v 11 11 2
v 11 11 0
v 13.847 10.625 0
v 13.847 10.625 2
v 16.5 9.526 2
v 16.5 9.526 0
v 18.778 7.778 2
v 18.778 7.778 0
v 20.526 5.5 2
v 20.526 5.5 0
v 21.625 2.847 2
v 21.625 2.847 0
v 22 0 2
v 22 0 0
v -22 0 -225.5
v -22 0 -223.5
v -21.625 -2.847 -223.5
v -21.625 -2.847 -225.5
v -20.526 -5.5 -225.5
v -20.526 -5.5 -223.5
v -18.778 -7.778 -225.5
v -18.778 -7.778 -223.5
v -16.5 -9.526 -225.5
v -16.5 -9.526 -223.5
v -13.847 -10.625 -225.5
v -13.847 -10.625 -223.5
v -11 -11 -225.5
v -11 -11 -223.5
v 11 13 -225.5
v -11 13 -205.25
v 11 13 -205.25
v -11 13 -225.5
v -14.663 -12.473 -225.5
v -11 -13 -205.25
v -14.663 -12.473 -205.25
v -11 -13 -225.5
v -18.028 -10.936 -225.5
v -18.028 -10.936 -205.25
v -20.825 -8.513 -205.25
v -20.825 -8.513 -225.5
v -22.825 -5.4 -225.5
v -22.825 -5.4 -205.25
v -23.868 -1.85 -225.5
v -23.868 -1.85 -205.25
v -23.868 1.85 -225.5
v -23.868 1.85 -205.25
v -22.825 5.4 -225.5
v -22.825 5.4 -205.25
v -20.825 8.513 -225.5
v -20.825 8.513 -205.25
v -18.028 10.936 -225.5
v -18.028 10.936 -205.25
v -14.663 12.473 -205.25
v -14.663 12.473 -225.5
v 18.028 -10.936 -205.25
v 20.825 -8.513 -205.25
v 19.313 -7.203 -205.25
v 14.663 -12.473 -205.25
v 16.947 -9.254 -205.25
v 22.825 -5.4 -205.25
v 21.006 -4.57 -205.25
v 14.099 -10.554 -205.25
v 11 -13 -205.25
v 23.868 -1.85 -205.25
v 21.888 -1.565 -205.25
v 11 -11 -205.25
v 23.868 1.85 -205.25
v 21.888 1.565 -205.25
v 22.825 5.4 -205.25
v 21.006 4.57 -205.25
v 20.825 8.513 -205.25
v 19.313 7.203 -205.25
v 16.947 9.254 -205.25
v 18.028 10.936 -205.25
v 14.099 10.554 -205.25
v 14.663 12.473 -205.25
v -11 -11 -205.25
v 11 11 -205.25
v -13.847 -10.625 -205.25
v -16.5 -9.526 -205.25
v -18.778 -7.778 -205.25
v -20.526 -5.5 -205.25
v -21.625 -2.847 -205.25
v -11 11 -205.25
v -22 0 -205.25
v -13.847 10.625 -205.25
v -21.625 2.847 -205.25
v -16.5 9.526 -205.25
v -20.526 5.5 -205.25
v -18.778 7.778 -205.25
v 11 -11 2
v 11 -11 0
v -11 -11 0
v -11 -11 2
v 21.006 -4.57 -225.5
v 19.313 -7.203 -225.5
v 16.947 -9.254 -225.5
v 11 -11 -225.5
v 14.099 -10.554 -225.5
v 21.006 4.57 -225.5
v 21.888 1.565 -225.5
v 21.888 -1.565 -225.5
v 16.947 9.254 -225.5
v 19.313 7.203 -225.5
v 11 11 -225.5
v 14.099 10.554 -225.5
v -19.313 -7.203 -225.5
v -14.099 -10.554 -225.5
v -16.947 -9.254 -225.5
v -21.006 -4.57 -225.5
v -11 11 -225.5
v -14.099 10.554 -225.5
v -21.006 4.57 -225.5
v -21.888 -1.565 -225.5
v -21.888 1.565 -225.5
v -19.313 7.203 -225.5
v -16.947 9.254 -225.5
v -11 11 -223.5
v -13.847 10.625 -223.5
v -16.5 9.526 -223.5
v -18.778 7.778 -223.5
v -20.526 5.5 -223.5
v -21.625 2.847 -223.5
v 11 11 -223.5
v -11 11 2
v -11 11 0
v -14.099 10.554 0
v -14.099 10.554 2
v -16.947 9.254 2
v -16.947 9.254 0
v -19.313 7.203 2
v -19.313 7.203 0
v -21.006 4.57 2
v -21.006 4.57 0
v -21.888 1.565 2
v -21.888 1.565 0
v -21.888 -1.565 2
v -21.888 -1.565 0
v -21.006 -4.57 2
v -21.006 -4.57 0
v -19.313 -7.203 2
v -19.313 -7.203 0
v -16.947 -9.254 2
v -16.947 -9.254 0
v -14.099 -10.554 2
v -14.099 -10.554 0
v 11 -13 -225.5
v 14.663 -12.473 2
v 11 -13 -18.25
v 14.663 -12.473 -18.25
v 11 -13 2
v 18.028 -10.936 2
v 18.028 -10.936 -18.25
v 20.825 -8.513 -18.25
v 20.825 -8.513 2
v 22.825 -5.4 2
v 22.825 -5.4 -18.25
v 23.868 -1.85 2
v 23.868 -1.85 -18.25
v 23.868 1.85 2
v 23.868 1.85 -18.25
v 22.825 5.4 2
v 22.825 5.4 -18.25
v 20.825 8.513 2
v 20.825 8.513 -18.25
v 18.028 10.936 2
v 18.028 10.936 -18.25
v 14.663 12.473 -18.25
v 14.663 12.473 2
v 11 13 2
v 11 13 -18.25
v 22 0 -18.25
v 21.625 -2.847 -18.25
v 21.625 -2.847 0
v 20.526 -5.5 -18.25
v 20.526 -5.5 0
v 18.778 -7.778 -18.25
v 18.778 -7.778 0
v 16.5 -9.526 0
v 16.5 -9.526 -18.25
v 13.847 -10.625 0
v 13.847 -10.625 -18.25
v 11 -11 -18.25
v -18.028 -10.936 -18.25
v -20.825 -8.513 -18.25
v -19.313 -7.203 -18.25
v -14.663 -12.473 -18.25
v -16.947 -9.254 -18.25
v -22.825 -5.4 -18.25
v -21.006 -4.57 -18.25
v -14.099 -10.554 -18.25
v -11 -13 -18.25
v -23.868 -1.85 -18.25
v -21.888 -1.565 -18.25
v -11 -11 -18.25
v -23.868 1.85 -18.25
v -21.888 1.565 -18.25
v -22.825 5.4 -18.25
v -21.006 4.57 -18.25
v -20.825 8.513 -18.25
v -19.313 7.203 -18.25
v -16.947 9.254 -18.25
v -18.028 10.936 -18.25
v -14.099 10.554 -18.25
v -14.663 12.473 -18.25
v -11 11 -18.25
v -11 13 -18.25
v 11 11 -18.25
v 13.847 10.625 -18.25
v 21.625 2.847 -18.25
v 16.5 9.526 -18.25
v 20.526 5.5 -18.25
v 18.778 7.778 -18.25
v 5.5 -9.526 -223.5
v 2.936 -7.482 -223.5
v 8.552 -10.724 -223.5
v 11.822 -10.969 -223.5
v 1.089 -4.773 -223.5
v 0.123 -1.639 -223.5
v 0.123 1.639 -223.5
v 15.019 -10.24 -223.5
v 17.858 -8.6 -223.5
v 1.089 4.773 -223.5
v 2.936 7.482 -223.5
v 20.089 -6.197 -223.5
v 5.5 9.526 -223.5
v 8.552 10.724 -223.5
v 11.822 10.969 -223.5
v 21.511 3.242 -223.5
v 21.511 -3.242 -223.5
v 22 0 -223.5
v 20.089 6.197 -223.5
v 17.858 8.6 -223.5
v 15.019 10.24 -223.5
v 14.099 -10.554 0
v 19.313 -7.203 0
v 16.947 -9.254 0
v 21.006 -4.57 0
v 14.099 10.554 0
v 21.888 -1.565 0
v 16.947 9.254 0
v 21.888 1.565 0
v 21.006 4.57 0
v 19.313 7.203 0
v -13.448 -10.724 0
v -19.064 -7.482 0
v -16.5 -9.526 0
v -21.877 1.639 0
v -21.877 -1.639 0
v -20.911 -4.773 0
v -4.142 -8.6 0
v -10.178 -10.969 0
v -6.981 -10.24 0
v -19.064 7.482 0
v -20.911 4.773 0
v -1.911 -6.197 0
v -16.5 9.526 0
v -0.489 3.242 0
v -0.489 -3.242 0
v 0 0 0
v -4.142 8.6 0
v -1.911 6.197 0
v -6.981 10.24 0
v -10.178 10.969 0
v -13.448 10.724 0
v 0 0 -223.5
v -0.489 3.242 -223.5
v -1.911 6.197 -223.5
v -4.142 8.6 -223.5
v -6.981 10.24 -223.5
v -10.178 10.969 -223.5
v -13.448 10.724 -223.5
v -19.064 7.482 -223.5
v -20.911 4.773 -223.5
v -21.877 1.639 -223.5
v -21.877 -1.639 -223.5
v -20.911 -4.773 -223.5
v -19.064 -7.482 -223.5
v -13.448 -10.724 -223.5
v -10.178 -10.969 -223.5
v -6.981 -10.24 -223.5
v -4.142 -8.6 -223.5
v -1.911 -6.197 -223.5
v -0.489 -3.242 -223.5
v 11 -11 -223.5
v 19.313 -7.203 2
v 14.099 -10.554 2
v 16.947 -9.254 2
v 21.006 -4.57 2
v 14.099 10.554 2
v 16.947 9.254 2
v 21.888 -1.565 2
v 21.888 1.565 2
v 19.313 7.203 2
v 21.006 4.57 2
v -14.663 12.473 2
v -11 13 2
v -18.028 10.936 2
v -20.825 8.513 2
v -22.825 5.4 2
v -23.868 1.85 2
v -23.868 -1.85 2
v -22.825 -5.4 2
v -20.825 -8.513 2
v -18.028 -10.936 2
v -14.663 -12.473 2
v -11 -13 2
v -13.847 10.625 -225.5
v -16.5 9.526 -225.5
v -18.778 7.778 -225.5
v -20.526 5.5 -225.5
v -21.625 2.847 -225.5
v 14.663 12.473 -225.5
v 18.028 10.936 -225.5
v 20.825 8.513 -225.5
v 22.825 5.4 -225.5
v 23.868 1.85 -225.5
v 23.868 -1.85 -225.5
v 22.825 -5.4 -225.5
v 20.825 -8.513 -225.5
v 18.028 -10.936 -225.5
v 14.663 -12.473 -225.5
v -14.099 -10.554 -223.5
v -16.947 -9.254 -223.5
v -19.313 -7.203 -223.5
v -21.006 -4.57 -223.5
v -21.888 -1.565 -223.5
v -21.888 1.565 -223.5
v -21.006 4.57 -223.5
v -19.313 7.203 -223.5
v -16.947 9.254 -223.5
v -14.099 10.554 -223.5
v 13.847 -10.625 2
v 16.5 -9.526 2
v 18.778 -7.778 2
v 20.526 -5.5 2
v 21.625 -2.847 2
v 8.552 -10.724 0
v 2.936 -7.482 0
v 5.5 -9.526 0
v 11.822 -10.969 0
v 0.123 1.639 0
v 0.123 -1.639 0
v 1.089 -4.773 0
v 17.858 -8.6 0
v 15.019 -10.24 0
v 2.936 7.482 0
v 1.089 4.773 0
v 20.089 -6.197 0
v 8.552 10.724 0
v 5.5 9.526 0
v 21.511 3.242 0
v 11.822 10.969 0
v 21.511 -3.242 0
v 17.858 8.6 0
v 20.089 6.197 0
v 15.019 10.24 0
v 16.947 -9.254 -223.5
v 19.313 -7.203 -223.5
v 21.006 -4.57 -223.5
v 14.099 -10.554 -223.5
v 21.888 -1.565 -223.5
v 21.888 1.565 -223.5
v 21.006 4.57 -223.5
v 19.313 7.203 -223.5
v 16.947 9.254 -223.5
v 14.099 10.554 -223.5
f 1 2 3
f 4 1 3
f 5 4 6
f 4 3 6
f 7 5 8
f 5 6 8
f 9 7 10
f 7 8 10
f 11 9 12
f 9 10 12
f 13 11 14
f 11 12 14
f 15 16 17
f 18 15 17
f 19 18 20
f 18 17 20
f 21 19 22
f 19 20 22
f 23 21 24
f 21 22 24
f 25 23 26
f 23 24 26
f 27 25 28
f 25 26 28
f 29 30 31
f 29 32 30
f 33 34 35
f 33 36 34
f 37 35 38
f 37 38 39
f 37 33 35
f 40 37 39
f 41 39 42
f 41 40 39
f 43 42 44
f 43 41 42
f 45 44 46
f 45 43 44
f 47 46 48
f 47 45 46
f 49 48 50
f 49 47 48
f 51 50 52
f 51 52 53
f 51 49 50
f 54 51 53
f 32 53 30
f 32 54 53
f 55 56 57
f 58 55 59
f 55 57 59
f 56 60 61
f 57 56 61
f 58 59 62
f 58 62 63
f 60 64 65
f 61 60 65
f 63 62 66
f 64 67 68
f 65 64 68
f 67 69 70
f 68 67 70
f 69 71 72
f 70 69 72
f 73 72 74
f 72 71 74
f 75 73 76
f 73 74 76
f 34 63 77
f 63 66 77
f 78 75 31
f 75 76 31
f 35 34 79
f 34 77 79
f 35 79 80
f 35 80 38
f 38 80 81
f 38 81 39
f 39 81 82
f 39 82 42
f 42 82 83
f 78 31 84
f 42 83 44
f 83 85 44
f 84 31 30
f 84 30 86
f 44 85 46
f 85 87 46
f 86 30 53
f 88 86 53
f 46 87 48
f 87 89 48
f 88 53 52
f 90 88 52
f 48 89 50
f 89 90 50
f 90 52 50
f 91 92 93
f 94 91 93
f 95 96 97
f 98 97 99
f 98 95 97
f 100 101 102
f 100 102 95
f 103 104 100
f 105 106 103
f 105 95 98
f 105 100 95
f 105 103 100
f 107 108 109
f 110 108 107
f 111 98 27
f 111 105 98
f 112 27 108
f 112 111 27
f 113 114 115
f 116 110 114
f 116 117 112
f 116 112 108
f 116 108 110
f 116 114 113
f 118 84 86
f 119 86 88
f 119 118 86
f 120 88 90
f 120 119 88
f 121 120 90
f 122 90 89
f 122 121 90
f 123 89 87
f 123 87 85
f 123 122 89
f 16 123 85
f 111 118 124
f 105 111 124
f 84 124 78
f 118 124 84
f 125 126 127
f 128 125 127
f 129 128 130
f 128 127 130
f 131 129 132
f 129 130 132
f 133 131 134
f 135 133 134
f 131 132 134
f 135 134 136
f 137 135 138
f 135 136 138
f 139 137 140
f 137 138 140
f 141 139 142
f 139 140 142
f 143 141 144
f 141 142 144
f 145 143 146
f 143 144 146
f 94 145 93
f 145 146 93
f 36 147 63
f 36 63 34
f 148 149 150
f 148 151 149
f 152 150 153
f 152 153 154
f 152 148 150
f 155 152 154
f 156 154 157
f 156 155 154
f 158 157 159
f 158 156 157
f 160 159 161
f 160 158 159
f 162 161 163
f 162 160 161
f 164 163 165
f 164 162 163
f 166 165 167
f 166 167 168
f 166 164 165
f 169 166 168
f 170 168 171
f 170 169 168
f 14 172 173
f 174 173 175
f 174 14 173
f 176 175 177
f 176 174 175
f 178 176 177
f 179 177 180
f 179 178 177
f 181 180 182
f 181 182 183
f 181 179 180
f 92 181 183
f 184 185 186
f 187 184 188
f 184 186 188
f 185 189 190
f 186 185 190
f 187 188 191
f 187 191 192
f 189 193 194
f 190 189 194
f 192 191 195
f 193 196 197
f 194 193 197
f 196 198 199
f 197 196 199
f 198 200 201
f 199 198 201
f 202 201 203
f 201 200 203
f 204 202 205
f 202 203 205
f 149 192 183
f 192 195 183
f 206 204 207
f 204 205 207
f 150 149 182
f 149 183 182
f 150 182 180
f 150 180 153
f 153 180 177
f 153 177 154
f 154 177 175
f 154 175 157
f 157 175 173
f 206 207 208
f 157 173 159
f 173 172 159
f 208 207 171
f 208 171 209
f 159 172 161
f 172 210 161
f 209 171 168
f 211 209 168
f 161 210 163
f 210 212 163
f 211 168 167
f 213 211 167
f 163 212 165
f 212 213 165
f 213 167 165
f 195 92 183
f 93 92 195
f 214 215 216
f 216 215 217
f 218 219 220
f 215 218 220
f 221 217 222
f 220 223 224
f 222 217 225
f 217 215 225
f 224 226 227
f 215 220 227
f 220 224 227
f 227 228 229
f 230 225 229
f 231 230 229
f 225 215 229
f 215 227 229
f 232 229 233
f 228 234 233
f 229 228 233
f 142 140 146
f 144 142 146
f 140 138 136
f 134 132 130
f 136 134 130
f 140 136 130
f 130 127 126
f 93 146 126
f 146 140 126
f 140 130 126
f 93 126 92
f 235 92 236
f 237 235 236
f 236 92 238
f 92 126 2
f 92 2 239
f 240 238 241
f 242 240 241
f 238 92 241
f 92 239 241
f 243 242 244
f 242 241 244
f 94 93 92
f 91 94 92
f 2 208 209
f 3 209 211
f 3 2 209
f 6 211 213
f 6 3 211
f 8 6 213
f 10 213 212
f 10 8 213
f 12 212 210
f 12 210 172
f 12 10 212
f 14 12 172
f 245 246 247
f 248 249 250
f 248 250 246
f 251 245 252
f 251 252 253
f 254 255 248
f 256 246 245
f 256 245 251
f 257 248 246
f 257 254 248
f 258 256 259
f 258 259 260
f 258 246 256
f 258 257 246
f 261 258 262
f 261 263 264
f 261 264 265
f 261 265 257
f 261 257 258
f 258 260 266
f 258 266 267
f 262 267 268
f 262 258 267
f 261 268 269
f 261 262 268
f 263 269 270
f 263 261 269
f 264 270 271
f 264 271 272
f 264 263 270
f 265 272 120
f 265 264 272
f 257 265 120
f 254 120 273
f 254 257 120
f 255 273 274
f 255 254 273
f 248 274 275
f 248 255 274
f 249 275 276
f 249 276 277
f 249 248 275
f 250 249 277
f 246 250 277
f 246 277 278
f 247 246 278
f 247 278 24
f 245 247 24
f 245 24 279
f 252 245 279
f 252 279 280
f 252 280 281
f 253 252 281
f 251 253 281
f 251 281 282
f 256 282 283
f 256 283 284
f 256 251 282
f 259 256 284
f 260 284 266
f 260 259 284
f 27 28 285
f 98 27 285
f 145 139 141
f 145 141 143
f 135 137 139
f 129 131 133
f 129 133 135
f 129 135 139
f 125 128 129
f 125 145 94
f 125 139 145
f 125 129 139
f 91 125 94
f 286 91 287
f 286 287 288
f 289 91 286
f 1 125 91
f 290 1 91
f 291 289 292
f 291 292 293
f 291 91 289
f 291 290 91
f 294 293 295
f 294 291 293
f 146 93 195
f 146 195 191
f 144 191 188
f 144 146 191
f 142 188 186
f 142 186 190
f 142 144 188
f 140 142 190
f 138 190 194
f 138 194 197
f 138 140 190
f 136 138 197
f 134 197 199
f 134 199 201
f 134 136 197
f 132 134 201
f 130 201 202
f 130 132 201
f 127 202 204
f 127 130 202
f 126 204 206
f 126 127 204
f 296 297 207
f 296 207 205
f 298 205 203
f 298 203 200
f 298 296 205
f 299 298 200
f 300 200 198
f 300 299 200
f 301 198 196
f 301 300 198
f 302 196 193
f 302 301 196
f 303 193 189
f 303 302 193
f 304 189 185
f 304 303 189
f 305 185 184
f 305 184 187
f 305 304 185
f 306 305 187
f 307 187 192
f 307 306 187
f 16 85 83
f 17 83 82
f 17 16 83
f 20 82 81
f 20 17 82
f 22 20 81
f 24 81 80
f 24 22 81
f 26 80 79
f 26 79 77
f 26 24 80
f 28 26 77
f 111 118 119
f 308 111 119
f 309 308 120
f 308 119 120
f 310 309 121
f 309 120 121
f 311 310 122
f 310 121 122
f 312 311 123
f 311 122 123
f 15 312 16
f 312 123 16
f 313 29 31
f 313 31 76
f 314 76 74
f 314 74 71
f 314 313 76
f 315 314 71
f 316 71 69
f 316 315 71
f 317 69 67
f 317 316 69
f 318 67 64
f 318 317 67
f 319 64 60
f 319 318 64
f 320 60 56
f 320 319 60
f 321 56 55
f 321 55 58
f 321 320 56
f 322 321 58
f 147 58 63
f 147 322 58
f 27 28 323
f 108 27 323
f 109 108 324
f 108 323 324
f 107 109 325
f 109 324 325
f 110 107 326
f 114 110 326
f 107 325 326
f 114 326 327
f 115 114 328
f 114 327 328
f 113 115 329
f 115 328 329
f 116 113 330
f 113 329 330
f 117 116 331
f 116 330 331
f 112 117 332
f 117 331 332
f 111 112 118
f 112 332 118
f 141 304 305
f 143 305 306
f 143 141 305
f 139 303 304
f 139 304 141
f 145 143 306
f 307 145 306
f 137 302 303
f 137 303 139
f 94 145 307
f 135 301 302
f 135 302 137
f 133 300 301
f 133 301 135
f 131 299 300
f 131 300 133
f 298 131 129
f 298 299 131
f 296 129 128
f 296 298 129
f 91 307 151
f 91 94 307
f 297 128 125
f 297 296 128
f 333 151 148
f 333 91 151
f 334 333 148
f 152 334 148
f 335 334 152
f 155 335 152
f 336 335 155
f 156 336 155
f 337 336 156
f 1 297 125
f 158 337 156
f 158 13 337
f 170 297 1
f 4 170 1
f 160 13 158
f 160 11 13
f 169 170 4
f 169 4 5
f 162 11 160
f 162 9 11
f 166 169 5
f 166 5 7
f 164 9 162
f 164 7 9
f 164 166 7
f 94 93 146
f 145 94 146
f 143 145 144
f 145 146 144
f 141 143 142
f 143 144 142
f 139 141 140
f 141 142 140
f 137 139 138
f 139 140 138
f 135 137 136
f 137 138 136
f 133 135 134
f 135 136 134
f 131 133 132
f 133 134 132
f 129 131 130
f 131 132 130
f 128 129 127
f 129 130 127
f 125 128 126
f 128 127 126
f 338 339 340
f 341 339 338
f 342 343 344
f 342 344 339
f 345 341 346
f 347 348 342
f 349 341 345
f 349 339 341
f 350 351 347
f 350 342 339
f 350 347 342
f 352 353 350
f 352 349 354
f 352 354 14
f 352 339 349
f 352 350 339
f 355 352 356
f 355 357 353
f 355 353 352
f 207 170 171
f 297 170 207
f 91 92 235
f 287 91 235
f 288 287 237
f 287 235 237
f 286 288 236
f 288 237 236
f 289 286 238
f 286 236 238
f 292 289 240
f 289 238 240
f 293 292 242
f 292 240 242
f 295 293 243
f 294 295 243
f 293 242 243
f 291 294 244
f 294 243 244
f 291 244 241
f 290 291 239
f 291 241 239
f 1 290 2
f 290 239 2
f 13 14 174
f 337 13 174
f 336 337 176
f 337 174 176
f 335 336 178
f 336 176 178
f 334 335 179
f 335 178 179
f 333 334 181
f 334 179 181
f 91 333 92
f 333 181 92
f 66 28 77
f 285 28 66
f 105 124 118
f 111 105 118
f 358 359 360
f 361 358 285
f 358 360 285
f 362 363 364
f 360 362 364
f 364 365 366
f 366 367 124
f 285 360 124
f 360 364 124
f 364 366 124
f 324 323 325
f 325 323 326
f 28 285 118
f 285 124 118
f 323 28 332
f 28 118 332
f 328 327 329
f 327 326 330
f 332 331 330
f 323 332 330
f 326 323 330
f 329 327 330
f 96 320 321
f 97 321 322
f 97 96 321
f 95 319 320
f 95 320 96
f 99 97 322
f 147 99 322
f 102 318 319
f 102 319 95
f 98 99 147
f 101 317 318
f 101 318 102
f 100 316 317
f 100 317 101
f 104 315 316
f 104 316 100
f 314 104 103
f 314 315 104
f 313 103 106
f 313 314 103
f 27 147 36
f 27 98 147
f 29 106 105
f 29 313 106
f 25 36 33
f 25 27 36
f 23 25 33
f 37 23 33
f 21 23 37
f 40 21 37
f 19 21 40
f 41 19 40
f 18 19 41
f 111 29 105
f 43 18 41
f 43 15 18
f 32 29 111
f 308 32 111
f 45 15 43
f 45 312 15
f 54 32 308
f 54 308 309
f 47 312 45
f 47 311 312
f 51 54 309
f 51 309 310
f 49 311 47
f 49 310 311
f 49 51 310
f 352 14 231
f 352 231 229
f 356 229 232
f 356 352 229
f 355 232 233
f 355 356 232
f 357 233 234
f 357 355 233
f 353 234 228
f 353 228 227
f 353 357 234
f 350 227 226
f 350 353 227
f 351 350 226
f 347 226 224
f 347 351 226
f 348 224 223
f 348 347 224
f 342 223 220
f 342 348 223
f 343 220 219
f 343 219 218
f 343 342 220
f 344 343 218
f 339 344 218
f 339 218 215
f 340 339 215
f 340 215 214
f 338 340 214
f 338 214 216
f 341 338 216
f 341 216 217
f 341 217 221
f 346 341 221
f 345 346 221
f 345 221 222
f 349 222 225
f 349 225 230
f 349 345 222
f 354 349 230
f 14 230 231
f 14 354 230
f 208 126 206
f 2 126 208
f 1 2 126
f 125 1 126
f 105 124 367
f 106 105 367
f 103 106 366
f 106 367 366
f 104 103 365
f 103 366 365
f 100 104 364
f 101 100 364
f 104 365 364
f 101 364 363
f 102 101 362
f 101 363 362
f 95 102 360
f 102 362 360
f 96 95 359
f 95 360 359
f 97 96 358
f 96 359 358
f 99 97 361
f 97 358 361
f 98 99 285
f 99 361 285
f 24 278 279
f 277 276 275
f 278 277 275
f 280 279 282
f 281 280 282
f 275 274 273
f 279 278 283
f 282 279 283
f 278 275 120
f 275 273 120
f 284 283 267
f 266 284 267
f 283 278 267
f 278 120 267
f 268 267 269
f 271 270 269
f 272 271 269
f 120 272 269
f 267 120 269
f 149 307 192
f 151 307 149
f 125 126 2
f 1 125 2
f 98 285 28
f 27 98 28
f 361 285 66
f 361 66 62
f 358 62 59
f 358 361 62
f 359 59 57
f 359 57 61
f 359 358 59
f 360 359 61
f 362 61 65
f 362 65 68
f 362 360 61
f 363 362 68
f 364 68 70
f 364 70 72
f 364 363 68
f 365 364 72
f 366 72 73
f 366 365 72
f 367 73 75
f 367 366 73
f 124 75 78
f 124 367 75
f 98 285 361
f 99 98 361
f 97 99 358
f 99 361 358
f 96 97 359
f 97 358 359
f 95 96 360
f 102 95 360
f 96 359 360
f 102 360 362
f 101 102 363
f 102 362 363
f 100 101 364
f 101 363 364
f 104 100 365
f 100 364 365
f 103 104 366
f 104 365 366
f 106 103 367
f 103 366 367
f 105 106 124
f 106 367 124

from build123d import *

# Parameters (mm, degrees)
ESQUISSE1_R              = 11
BOSS_EXTRU_2_DEPTH       = 223.5
BOSS_EXTRU_2_2_DEPTH     = 223.5
BOSS_EXTRU_8_DEPTH       = 2
BOSS_EXTRU_8_DEPTH_BACK  = 18.25
ESQUISSE1_6_R            = 11
BOSS_EXTRU_29_DEPTH      = 2
BOSS_EXTRU_33_DEPTH      = 2
BOSS_EXTRU_33_DEPTH_BACK = 18.25
BOSS_EXTRU_34_DEPTH      = 2


with BuildPart() as part:
    # Esquisse1 → Boss.-Extru.2 (new body)
    with BuildSketch(Plane.XY):
        with Locations((-11, 0)):
            Circle(ESQUISSE1_R)
    extrude(amount=-BOSS_EXTRU_2_DEPTH)


with BuildPart() as body_2:
    # Esquisse1 → Boss.-Extru.2 2 (new body)
    with BuildSketch(Plane.XY):
        with Locations((11, 0)):
            Circle(ESQUISSE1_R)
    extrude(amount=-BOSS_EXTRU_2_2_DEPTH)


with BuildPart() as body_3:
    # Esquisse1_5 → Boss.-Extru.8 (new body, two sides)
    with BuildSketch(Plane.XY) as boss_extru_8_sk:
        with BuildLine():
            Line((11, 13), (-11, 13))
            ThreePointArc((-11, 13), (-24, 0), (-11, -13))
            Line((-11, -13), (11, -13))
            ThreePointArc((11, -13), (24, 0), (11, 13))
        make_face()
        with BuildLine():
            Line((11, -11), (-11, -11))
            ThreePointArc((-11, -11), (-22, 0), (-11, 11))
            Line((-11, 11), (11, 11))
            ThreePointArc((11, 11), (18.778174593, 7.778174593), (22, 0))
            ThreePointArc((22, 0), (18.778174593, -7.778174593), (11, -11))
        make_face(mode=Mode.SUBTRACT)
    extrude(amount=BOSS_EXTRU_8_DEPTH)
    extrude(boss_extru_8_sk.sketch, amount=-BOSS_EXTRU_8_DEPTH_BACK)


with BuildPart() as body_4:
    # Esquisse1_6 → Boss.-Extru.29 (new body)
    with BuildSketch(Plane.XY):
        with Locations((-11, 0)):
            Circle(ESQUISSE1_6_R)
        with Locations((11, 0)):
            Circle(ESQUISSE1_6_R)
        with BuildLine():
            Line((11, 11), (-11, 11))
            ThreePointArc((-11, 11), (-3.221825407, 7.778174593), (0, 0))
            ThreePointArc((0, 0), (3.221825407, 7.778174593), (11, 11))
        make_face()
        with BuildLine():
            ThreePointArc((0, 0), (-3.221825407, -7.778174593), (-11, -11))
            Line((-11, -11), (11, -11))
            ThreePointArc((11, -11), (3.221825407, -7.778174593), (0, 0))
        make_face()
    extrude(amount=BOSS_EXTRU_29_DEPTH)


with BuildPart() as body_5:
    # Esquisse8 → Boss.-Extru.33 (new body, two sides)
    with BuildSketch(Plane(origin=(0, 0, -223.5), x_dir=(-1, 0, 0), z_dir=(0, 0, -1))) as boss_extru_33_sk:
        with BuildLine():
            Line((11, 13), (-11, 13))
            ThreePointArc((-11, 13), (-24, 0), (-11, -13))
            Line((-11, -13), (11, -13))
            ThreePointArc((11, -13), (24, 0), (11, 13))
        make_face()
        with BuildLine():
            Line((11, -11), (-11, -11))
            ThreePointArc((-11, -11), (-22, 0), (-11, 11))
            Line((-11, 11), (11, 11))
            ThreePointArc((11, 11), (18.778174593, 7.778174593), (22, 0))
            ThreePointArc((22, 0), (18.778174593, -7.778174593), (11, -11))
        make_face(mode=Mode.SUBTRACT)
    extrude(amount=BOSS_EXTRU_33_DEPTH)
    extrude(boss_extru_33_sk.sketch, amount=-BOSS_EXTRU_33_DEPTH_BACK)


with BuildPart() as body_6:
    # Esquisse8_3 → Boss.-Extru.34 (new body)
    with BuildSketch(Plane(origin=(0, 0, -223.5), x_dir=(-1, 0, 0), z_dir=(0, 0, -1))):
        with BuildLine():
            ThreePointArc((-11, 11), (-22, 0), (-11, -11))
            Line((-11, -11), (11, -11))
            ThreePointArc((11, -11), (22, 0), (11, 11))
            Line((11, 11), (-11, 11))
        make_face()
    extrude(amount=BOSS_EXTRU_34_DEPTH)


solid = Compound([part.part, body_2.part, body_3.part, body_4.part, body_5.part, body_6.part])
